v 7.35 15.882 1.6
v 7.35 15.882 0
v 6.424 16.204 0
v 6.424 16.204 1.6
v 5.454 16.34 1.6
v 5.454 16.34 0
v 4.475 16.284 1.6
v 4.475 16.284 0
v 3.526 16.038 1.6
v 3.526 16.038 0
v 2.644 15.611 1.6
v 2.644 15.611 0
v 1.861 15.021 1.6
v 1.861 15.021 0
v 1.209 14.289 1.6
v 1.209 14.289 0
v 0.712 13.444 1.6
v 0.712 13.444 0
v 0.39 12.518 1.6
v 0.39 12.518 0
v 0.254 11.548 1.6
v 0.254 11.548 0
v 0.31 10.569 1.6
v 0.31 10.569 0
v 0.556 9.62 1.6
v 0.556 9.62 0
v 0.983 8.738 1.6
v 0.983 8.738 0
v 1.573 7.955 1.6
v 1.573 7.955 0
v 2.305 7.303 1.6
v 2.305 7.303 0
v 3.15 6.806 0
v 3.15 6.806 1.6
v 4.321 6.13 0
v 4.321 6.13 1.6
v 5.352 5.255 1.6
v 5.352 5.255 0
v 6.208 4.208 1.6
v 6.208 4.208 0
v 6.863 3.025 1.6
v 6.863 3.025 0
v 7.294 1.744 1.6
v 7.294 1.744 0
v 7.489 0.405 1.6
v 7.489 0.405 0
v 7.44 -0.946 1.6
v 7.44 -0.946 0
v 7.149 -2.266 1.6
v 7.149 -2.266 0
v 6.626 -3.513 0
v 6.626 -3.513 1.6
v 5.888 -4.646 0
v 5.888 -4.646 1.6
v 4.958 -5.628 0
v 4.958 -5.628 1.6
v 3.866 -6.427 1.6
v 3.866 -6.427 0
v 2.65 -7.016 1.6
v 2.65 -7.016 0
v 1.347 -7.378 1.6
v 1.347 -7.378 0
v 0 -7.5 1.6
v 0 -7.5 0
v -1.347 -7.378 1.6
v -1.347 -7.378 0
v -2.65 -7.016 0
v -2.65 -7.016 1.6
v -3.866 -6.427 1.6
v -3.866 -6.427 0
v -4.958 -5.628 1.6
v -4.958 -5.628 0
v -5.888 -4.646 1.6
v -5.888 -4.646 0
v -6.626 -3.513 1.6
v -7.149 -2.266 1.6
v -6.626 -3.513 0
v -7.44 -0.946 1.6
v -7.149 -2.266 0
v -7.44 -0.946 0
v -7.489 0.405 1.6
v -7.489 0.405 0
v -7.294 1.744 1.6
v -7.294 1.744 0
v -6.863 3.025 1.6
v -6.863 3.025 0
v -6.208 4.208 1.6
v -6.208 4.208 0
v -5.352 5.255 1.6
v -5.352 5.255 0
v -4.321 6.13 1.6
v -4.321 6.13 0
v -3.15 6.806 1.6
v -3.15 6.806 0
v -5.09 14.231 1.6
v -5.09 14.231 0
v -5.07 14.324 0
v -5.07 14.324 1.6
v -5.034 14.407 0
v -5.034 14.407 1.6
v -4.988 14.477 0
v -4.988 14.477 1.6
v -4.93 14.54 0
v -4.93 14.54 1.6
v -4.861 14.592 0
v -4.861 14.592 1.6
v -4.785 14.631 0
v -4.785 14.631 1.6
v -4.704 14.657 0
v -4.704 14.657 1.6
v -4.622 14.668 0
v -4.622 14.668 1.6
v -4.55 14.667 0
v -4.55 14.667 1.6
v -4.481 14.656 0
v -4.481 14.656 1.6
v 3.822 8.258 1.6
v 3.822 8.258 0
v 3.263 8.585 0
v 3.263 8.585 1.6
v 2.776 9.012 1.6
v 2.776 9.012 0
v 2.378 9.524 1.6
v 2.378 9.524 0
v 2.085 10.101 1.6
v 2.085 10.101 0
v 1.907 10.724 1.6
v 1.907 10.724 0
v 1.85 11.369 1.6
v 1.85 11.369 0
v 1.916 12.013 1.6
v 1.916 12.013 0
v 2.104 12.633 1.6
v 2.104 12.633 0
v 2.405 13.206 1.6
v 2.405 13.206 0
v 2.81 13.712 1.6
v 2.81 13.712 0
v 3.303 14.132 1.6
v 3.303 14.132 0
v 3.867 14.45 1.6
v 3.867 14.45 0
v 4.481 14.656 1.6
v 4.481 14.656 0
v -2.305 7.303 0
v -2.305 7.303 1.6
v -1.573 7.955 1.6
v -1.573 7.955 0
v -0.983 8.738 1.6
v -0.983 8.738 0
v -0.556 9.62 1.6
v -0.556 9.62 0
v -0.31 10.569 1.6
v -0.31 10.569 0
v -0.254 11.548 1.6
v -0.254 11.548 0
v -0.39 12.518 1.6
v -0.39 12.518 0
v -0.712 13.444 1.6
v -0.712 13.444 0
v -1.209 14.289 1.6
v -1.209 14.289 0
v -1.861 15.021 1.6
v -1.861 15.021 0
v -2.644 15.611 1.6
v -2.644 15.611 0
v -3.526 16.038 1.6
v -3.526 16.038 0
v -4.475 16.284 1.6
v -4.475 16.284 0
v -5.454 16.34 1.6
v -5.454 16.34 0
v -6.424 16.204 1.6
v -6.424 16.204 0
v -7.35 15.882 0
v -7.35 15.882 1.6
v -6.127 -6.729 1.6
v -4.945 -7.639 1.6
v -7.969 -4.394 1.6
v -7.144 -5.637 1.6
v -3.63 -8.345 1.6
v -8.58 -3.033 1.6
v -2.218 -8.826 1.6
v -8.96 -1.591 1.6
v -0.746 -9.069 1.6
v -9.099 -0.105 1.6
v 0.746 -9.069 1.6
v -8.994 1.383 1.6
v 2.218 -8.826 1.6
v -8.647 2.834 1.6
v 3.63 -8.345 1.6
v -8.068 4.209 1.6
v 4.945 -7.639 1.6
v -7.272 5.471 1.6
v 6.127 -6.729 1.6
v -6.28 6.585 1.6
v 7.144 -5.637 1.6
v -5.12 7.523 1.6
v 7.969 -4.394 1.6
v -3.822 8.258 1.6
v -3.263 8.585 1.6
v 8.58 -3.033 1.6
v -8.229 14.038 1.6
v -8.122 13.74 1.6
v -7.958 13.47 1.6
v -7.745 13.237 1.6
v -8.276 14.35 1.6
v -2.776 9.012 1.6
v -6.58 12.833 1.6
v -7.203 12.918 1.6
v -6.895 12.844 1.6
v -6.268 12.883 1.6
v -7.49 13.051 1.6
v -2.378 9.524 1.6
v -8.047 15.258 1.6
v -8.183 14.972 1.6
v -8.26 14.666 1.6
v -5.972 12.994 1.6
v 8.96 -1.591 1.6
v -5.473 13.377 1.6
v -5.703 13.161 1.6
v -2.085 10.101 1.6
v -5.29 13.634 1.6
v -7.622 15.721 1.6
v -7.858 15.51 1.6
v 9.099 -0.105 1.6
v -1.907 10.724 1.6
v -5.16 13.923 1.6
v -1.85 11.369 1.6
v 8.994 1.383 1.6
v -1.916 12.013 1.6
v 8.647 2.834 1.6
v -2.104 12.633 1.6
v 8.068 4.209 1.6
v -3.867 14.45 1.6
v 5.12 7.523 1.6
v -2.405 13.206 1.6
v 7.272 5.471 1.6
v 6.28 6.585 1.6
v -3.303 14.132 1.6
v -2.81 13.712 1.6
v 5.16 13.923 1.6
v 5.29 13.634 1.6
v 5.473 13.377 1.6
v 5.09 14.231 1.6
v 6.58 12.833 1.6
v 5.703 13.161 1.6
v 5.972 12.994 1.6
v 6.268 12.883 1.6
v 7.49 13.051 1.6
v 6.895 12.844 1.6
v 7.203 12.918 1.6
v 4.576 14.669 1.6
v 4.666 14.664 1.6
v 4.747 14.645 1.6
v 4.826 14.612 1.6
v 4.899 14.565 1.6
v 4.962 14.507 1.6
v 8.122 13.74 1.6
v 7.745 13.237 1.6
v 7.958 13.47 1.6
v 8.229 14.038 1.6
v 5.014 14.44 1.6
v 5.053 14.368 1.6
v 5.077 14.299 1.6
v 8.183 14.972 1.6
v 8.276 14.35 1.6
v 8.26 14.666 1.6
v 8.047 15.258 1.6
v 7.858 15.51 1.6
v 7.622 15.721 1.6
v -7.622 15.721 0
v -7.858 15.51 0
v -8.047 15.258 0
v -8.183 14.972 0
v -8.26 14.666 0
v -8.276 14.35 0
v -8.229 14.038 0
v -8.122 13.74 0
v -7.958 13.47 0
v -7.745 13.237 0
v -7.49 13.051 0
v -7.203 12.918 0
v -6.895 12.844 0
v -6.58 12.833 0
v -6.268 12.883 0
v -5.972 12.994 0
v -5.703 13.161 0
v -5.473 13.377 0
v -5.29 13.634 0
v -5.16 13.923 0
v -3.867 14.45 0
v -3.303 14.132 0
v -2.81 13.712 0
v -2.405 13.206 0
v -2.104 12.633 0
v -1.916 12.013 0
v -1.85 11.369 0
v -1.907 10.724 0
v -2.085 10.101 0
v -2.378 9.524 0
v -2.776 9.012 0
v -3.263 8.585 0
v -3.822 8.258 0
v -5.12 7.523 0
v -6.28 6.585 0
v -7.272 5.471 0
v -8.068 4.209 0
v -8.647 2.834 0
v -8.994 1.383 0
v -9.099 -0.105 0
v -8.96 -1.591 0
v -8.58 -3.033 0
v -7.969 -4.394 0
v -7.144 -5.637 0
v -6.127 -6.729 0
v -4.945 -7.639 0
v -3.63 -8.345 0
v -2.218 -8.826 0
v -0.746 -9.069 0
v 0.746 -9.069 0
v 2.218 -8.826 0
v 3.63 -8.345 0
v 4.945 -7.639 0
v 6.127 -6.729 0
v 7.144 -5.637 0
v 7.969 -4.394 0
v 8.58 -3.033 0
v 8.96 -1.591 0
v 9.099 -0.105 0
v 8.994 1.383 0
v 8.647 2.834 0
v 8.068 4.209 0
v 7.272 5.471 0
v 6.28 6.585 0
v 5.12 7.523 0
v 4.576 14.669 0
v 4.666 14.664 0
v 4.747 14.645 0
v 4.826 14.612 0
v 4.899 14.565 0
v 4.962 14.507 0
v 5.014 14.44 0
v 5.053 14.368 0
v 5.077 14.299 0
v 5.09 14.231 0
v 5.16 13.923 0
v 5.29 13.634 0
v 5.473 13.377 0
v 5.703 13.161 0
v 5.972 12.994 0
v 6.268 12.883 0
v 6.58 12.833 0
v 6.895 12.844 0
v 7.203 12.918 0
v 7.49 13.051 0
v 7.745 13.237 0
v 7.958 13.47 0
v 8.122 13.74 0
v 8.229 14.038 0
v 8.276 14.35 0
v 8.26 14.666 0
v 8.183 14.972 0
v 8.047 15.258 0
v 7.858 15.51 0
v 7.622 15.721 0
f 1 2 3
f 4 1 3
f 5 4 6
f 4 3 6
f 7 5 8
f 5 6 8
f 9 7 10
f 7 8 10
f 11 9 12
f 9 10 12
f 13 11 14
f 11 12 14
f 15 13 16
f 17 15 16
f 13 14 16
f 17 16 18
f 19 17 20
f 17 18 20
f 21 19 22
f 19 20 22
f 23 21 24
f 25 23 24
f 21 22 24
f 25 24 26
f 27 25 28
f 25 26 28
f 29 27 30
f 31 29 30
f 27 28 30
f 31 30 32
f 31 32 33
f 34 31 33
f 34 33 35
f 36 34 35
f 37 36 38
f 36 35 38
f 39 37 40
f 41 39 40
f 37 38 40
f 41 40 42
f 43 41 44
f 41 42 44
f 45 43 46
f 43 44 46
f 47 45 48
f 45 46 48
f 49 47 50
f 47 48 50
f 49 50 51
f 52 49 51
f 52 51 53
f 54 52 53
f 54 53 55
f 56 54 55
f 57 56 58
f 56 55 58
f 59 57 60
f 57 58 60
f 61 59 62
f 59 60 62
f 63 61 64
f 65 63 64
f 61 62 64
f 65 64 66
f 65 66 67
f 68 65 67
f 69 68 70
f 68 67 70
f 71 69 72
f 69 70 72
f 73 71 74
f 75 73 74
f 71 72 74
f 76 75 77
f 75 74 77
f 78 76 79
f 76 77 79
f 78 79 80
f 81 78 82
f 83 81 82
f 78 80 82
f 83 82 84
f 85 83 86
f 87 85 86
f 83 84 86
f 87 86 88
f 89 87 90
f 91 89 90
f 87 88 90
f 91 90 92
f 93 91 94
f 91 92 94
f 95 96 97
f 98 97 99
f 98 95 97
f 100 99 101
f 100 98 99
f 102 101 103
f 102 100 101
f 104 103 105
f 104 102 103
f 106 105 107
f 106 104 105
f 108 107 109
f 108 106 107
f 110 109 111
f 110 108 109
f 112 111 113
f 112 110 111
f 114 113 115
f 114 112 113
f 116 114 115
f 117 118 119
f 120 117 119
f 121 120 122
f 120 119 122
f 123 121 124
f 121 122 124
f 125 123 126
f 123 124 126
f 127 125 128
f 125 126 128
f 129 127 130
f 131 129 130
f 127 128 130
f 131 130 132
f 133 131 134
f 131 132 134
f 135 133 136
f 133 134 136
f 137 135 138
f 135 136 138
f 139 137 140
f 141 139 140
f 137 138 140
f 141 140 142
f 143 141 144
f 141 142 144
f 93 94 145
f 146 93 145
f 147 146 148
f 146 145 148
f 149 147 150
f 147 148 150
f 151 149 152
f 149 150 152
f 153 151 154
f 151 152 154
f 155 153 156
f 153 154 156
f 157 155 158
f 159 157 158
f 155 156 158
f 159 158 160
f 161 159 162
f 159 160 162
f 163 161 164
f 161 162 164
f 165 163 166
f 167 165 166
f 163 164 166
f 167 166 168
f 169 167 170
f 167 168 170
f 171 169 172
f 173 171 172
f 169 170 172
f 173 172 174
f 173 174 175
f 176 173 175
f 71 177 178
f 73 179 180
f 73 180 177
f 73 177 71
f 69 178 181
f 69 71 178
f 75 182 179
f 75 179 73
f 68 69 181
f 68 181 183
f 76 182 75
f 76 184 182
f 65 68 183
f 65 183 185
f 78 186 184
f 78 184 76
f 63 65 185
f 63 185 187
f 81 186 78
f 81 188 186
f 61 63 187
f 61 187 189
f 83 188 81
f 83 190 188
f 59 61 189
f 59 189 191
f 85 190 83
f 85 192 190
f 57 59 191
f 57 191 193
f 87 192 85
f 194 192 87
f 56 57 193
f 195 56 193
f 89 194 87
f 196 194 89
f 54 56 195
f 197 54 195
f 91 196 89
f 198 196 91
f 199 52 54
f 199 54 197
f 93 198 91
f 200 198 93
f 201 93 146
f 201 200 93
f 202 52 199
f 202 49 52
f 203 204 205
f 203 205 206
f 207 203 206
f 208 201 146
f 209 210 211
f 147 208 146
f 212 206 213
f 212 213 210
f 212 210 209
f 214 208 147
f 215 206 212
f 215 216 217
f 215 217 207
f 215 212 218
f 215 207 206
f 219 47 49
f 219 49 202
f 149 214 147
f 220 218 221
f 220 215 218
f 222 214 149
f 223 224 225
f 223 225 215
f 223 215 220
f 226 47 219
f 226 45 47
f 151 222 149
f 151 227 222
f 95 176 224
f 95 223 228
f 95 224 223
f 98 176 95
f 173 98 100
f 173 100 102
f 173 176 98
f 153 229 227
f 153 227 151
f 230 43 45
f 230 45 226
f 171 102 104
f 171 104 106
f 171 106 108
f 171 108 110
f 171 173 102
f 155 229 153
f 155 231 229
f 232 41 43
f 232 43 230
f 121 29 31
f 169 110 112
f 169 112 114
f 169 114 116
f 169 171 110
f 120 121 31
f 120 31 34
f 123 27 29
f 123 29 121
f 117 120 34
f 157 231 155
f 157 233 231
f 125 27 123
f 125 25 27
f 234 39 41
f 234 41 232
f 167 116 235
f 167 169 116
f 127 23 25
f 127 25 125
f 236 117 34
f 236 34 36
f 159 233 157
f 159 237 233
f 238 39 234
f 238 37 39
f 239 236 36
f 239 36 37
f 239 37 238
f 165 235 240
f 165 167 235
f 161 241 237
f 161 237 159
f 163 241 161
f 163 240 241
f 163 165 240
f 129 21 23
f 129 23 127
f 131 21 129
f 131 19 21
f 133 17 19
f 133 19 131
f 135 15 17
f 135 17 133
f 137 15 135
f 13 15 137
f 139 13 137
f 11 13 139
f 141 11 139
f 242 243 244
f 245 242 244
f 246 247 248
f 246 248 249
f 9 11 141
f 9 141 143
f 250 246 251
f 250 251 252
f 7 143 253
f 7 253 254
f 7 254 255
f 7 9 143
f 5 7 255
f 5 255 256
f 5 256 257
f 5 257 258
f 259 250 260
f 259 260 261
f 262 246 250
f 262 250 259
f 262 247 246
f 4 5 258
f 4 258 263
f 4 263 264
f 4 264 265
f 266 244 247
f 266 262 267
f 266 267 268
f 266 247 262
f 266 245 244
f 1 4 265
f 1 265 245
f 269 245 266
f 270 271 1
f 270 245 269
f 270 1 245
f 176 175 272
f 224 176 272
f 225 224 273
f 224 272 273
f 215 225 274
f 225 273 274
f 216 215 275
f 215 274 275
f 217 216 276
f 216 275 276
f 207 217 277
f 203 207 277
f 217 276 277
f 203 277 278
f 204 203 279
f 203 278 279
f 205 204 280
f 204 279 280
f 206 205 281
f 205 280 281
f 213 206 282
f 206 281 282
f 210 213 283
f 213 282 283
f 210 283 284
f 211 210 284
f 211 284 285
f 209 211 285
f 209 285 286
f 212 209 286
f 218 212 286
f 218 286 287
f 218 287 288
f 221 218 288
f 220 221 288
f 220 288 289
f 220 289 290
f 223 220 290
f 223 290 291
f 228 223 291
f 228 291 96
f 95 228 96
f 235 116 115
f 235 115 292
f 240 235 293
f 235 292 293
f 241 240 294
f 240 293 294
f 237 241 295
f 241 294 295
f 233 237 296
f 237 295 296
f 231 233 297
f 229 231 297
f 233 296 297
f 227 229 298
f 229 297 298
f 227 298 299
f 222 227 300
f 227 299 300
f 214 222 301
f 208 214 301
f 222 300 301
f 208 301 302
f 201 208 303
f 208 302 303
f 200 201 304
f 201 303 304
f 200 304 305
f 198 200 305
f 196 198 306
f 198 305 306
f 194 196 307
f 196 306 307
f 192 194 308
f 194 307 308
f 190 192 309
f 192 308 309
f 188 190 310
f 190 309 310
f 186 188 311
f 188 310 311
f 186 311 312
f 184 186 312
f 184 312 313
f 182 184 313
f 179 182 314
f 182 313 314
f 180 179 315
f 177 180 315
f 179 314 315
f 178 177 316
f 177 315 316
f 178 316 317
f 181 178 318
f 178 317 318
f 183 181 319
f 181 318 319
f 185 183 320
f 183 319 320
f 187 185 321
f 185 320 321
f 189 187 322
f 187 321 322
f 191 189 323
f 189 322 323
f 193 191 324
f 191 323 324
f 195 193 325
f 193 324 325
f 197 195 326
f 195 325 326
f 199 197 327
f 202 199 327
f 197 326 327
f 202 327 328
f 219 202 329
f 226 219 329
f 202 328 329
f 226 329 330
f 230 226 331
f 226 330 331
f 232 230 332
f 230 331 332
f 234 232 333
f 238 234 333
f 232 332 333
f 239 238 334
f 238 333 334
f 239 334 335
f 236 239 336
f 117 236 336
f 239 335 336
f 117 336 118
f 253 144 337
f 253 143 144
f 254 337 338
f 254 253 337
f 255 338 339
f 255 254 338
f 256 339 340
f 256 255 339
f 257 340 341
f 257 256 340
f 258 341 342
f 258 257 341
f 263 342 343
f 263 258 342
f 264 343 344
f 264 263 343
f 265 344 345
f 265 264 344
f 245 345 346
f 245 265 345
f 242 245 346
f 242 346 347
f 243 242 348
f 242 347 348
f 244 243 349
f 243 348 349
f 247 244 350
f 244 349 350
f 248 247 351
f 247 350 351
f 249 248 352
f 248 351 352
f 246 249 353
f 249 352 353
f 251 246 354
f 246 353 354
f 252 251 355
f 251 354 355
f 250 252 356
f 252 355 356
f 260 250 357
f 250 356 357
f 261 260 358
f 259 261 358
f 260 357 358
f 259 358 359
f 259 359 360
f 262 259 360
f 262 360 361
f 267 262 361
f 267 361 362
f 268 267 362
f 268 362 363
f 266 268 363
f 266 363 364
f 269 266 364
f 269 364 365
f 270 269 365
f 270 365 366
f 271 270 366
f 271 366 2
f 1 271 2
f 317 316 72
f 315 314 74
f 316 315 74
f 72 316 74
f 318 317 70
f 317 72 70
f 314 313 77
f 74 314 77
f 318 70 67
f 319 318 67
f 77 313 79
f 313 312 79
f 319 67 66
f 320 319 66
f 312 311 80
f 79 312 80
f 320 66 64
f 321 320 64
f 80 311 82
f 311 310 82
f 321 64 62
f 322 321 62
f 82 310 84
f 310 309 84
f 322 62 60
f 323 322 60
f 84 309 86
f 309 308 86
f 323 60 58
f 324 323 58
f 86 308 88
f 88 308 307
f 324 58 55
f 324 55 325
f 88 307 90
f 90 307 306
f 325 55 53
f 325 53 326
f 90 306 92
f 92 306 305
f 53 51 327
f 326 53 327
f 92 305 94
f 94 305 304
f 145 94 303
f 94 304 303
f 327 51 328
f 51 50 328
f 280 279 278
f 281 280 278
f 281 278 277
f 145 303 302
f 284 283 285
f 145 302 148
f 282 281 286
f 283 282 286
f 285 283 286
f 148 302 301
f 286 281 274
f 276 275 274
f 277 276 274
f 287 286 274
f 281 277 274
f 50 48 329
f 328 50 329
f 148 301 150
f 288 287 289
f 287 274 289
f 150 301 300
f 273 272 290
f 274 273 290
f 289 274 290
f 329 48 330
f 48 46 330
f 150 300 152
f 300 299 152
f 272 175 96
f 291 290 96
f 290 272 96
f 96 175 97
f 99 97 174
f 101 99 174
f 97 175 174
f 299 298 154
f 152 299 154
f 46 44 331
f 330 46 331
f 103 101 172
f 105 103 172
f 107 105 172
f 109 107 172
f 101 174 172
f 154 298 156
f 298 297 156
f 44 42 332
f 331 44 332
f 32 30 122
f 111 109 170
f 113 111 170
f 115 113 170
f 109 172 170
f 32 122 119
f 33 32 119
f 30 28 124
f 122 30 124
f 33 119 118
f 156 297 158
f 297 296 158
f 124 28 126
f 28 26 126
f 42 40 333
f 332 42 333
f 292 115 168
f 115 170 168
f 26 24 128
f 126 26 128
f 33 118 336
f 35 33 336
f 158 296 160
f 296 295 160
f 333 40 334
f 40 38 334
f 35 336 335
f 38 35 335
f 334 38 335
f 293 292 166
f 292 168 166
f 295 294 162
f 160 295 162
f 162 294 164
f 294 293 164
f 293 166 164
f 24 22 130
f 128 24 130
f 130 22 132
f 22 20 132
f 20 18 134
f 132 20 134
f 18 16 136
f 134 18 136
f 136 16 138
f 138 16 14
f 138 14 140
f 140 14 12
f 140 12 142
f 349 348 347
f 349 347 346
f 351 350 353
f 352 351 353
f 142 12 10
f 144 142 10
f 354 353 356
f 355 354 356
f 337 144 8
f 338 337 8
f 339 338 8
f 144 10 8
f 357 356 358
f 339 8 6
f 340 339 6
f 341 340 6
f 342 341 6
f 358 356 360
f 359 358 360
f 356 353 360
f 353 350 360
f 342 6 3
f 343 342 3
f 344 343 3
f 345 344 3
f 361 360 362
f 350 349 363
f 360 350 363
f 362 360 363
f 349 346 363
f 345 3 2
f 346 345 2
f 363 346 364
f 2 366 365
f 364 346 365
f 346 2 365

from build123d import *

# Parameters (mm, degrees)
F2_DEPTH = 1.6
F3_R     = 0.5


with BuildPart() as f2:
    # F1 (on Top) → F2 (new body)
    with BuildSketch(Plane.XY):
        with BuildLine():
            ThreePointArc((3.15, 6.806431), (0, -7.5), (-3.15, 6.806431))
            ThreePointArc((-3.15, 6.806431), (-0.712379, 13.444051), (-7.35, 15.881672))
            ThreePointArc((-7.35, 15.881672), (-7.403636, 13.003641), (-5.108611, 14.74111))
            ThreePointArc((-5.108611, 14.74111), (-1.915048, 12.00594), (-3.822, 8.258469))
            ThreePointArc((-3.822, 8.258469), (0, -9.1), (3.822, 8.258469))
            ThreePointArc((3.822, 8.258469), (1.915048, 12.00594), (5.108611, 14.74111))
            ThreePointArc((5.108611, 14.74111), (7.403636, 13.003641), (7.35, 15.881672))
            ThreePointArc((7.35, 15.881672), (0.712379, 13.444051), (3.15, 6.806431))
        make_face()
    extrude(amount=F2_DEPTH)

    # F3
    f3_edges = [f2.edges().sort_by_distance(p)[0] for p in [
        (5.108611, 14.74111, 0.8),
        (-5.108611, 14.74111, 0.8),
    ]]
    fillet(f3_edges, radius=F3_R)


solid = f2.part
